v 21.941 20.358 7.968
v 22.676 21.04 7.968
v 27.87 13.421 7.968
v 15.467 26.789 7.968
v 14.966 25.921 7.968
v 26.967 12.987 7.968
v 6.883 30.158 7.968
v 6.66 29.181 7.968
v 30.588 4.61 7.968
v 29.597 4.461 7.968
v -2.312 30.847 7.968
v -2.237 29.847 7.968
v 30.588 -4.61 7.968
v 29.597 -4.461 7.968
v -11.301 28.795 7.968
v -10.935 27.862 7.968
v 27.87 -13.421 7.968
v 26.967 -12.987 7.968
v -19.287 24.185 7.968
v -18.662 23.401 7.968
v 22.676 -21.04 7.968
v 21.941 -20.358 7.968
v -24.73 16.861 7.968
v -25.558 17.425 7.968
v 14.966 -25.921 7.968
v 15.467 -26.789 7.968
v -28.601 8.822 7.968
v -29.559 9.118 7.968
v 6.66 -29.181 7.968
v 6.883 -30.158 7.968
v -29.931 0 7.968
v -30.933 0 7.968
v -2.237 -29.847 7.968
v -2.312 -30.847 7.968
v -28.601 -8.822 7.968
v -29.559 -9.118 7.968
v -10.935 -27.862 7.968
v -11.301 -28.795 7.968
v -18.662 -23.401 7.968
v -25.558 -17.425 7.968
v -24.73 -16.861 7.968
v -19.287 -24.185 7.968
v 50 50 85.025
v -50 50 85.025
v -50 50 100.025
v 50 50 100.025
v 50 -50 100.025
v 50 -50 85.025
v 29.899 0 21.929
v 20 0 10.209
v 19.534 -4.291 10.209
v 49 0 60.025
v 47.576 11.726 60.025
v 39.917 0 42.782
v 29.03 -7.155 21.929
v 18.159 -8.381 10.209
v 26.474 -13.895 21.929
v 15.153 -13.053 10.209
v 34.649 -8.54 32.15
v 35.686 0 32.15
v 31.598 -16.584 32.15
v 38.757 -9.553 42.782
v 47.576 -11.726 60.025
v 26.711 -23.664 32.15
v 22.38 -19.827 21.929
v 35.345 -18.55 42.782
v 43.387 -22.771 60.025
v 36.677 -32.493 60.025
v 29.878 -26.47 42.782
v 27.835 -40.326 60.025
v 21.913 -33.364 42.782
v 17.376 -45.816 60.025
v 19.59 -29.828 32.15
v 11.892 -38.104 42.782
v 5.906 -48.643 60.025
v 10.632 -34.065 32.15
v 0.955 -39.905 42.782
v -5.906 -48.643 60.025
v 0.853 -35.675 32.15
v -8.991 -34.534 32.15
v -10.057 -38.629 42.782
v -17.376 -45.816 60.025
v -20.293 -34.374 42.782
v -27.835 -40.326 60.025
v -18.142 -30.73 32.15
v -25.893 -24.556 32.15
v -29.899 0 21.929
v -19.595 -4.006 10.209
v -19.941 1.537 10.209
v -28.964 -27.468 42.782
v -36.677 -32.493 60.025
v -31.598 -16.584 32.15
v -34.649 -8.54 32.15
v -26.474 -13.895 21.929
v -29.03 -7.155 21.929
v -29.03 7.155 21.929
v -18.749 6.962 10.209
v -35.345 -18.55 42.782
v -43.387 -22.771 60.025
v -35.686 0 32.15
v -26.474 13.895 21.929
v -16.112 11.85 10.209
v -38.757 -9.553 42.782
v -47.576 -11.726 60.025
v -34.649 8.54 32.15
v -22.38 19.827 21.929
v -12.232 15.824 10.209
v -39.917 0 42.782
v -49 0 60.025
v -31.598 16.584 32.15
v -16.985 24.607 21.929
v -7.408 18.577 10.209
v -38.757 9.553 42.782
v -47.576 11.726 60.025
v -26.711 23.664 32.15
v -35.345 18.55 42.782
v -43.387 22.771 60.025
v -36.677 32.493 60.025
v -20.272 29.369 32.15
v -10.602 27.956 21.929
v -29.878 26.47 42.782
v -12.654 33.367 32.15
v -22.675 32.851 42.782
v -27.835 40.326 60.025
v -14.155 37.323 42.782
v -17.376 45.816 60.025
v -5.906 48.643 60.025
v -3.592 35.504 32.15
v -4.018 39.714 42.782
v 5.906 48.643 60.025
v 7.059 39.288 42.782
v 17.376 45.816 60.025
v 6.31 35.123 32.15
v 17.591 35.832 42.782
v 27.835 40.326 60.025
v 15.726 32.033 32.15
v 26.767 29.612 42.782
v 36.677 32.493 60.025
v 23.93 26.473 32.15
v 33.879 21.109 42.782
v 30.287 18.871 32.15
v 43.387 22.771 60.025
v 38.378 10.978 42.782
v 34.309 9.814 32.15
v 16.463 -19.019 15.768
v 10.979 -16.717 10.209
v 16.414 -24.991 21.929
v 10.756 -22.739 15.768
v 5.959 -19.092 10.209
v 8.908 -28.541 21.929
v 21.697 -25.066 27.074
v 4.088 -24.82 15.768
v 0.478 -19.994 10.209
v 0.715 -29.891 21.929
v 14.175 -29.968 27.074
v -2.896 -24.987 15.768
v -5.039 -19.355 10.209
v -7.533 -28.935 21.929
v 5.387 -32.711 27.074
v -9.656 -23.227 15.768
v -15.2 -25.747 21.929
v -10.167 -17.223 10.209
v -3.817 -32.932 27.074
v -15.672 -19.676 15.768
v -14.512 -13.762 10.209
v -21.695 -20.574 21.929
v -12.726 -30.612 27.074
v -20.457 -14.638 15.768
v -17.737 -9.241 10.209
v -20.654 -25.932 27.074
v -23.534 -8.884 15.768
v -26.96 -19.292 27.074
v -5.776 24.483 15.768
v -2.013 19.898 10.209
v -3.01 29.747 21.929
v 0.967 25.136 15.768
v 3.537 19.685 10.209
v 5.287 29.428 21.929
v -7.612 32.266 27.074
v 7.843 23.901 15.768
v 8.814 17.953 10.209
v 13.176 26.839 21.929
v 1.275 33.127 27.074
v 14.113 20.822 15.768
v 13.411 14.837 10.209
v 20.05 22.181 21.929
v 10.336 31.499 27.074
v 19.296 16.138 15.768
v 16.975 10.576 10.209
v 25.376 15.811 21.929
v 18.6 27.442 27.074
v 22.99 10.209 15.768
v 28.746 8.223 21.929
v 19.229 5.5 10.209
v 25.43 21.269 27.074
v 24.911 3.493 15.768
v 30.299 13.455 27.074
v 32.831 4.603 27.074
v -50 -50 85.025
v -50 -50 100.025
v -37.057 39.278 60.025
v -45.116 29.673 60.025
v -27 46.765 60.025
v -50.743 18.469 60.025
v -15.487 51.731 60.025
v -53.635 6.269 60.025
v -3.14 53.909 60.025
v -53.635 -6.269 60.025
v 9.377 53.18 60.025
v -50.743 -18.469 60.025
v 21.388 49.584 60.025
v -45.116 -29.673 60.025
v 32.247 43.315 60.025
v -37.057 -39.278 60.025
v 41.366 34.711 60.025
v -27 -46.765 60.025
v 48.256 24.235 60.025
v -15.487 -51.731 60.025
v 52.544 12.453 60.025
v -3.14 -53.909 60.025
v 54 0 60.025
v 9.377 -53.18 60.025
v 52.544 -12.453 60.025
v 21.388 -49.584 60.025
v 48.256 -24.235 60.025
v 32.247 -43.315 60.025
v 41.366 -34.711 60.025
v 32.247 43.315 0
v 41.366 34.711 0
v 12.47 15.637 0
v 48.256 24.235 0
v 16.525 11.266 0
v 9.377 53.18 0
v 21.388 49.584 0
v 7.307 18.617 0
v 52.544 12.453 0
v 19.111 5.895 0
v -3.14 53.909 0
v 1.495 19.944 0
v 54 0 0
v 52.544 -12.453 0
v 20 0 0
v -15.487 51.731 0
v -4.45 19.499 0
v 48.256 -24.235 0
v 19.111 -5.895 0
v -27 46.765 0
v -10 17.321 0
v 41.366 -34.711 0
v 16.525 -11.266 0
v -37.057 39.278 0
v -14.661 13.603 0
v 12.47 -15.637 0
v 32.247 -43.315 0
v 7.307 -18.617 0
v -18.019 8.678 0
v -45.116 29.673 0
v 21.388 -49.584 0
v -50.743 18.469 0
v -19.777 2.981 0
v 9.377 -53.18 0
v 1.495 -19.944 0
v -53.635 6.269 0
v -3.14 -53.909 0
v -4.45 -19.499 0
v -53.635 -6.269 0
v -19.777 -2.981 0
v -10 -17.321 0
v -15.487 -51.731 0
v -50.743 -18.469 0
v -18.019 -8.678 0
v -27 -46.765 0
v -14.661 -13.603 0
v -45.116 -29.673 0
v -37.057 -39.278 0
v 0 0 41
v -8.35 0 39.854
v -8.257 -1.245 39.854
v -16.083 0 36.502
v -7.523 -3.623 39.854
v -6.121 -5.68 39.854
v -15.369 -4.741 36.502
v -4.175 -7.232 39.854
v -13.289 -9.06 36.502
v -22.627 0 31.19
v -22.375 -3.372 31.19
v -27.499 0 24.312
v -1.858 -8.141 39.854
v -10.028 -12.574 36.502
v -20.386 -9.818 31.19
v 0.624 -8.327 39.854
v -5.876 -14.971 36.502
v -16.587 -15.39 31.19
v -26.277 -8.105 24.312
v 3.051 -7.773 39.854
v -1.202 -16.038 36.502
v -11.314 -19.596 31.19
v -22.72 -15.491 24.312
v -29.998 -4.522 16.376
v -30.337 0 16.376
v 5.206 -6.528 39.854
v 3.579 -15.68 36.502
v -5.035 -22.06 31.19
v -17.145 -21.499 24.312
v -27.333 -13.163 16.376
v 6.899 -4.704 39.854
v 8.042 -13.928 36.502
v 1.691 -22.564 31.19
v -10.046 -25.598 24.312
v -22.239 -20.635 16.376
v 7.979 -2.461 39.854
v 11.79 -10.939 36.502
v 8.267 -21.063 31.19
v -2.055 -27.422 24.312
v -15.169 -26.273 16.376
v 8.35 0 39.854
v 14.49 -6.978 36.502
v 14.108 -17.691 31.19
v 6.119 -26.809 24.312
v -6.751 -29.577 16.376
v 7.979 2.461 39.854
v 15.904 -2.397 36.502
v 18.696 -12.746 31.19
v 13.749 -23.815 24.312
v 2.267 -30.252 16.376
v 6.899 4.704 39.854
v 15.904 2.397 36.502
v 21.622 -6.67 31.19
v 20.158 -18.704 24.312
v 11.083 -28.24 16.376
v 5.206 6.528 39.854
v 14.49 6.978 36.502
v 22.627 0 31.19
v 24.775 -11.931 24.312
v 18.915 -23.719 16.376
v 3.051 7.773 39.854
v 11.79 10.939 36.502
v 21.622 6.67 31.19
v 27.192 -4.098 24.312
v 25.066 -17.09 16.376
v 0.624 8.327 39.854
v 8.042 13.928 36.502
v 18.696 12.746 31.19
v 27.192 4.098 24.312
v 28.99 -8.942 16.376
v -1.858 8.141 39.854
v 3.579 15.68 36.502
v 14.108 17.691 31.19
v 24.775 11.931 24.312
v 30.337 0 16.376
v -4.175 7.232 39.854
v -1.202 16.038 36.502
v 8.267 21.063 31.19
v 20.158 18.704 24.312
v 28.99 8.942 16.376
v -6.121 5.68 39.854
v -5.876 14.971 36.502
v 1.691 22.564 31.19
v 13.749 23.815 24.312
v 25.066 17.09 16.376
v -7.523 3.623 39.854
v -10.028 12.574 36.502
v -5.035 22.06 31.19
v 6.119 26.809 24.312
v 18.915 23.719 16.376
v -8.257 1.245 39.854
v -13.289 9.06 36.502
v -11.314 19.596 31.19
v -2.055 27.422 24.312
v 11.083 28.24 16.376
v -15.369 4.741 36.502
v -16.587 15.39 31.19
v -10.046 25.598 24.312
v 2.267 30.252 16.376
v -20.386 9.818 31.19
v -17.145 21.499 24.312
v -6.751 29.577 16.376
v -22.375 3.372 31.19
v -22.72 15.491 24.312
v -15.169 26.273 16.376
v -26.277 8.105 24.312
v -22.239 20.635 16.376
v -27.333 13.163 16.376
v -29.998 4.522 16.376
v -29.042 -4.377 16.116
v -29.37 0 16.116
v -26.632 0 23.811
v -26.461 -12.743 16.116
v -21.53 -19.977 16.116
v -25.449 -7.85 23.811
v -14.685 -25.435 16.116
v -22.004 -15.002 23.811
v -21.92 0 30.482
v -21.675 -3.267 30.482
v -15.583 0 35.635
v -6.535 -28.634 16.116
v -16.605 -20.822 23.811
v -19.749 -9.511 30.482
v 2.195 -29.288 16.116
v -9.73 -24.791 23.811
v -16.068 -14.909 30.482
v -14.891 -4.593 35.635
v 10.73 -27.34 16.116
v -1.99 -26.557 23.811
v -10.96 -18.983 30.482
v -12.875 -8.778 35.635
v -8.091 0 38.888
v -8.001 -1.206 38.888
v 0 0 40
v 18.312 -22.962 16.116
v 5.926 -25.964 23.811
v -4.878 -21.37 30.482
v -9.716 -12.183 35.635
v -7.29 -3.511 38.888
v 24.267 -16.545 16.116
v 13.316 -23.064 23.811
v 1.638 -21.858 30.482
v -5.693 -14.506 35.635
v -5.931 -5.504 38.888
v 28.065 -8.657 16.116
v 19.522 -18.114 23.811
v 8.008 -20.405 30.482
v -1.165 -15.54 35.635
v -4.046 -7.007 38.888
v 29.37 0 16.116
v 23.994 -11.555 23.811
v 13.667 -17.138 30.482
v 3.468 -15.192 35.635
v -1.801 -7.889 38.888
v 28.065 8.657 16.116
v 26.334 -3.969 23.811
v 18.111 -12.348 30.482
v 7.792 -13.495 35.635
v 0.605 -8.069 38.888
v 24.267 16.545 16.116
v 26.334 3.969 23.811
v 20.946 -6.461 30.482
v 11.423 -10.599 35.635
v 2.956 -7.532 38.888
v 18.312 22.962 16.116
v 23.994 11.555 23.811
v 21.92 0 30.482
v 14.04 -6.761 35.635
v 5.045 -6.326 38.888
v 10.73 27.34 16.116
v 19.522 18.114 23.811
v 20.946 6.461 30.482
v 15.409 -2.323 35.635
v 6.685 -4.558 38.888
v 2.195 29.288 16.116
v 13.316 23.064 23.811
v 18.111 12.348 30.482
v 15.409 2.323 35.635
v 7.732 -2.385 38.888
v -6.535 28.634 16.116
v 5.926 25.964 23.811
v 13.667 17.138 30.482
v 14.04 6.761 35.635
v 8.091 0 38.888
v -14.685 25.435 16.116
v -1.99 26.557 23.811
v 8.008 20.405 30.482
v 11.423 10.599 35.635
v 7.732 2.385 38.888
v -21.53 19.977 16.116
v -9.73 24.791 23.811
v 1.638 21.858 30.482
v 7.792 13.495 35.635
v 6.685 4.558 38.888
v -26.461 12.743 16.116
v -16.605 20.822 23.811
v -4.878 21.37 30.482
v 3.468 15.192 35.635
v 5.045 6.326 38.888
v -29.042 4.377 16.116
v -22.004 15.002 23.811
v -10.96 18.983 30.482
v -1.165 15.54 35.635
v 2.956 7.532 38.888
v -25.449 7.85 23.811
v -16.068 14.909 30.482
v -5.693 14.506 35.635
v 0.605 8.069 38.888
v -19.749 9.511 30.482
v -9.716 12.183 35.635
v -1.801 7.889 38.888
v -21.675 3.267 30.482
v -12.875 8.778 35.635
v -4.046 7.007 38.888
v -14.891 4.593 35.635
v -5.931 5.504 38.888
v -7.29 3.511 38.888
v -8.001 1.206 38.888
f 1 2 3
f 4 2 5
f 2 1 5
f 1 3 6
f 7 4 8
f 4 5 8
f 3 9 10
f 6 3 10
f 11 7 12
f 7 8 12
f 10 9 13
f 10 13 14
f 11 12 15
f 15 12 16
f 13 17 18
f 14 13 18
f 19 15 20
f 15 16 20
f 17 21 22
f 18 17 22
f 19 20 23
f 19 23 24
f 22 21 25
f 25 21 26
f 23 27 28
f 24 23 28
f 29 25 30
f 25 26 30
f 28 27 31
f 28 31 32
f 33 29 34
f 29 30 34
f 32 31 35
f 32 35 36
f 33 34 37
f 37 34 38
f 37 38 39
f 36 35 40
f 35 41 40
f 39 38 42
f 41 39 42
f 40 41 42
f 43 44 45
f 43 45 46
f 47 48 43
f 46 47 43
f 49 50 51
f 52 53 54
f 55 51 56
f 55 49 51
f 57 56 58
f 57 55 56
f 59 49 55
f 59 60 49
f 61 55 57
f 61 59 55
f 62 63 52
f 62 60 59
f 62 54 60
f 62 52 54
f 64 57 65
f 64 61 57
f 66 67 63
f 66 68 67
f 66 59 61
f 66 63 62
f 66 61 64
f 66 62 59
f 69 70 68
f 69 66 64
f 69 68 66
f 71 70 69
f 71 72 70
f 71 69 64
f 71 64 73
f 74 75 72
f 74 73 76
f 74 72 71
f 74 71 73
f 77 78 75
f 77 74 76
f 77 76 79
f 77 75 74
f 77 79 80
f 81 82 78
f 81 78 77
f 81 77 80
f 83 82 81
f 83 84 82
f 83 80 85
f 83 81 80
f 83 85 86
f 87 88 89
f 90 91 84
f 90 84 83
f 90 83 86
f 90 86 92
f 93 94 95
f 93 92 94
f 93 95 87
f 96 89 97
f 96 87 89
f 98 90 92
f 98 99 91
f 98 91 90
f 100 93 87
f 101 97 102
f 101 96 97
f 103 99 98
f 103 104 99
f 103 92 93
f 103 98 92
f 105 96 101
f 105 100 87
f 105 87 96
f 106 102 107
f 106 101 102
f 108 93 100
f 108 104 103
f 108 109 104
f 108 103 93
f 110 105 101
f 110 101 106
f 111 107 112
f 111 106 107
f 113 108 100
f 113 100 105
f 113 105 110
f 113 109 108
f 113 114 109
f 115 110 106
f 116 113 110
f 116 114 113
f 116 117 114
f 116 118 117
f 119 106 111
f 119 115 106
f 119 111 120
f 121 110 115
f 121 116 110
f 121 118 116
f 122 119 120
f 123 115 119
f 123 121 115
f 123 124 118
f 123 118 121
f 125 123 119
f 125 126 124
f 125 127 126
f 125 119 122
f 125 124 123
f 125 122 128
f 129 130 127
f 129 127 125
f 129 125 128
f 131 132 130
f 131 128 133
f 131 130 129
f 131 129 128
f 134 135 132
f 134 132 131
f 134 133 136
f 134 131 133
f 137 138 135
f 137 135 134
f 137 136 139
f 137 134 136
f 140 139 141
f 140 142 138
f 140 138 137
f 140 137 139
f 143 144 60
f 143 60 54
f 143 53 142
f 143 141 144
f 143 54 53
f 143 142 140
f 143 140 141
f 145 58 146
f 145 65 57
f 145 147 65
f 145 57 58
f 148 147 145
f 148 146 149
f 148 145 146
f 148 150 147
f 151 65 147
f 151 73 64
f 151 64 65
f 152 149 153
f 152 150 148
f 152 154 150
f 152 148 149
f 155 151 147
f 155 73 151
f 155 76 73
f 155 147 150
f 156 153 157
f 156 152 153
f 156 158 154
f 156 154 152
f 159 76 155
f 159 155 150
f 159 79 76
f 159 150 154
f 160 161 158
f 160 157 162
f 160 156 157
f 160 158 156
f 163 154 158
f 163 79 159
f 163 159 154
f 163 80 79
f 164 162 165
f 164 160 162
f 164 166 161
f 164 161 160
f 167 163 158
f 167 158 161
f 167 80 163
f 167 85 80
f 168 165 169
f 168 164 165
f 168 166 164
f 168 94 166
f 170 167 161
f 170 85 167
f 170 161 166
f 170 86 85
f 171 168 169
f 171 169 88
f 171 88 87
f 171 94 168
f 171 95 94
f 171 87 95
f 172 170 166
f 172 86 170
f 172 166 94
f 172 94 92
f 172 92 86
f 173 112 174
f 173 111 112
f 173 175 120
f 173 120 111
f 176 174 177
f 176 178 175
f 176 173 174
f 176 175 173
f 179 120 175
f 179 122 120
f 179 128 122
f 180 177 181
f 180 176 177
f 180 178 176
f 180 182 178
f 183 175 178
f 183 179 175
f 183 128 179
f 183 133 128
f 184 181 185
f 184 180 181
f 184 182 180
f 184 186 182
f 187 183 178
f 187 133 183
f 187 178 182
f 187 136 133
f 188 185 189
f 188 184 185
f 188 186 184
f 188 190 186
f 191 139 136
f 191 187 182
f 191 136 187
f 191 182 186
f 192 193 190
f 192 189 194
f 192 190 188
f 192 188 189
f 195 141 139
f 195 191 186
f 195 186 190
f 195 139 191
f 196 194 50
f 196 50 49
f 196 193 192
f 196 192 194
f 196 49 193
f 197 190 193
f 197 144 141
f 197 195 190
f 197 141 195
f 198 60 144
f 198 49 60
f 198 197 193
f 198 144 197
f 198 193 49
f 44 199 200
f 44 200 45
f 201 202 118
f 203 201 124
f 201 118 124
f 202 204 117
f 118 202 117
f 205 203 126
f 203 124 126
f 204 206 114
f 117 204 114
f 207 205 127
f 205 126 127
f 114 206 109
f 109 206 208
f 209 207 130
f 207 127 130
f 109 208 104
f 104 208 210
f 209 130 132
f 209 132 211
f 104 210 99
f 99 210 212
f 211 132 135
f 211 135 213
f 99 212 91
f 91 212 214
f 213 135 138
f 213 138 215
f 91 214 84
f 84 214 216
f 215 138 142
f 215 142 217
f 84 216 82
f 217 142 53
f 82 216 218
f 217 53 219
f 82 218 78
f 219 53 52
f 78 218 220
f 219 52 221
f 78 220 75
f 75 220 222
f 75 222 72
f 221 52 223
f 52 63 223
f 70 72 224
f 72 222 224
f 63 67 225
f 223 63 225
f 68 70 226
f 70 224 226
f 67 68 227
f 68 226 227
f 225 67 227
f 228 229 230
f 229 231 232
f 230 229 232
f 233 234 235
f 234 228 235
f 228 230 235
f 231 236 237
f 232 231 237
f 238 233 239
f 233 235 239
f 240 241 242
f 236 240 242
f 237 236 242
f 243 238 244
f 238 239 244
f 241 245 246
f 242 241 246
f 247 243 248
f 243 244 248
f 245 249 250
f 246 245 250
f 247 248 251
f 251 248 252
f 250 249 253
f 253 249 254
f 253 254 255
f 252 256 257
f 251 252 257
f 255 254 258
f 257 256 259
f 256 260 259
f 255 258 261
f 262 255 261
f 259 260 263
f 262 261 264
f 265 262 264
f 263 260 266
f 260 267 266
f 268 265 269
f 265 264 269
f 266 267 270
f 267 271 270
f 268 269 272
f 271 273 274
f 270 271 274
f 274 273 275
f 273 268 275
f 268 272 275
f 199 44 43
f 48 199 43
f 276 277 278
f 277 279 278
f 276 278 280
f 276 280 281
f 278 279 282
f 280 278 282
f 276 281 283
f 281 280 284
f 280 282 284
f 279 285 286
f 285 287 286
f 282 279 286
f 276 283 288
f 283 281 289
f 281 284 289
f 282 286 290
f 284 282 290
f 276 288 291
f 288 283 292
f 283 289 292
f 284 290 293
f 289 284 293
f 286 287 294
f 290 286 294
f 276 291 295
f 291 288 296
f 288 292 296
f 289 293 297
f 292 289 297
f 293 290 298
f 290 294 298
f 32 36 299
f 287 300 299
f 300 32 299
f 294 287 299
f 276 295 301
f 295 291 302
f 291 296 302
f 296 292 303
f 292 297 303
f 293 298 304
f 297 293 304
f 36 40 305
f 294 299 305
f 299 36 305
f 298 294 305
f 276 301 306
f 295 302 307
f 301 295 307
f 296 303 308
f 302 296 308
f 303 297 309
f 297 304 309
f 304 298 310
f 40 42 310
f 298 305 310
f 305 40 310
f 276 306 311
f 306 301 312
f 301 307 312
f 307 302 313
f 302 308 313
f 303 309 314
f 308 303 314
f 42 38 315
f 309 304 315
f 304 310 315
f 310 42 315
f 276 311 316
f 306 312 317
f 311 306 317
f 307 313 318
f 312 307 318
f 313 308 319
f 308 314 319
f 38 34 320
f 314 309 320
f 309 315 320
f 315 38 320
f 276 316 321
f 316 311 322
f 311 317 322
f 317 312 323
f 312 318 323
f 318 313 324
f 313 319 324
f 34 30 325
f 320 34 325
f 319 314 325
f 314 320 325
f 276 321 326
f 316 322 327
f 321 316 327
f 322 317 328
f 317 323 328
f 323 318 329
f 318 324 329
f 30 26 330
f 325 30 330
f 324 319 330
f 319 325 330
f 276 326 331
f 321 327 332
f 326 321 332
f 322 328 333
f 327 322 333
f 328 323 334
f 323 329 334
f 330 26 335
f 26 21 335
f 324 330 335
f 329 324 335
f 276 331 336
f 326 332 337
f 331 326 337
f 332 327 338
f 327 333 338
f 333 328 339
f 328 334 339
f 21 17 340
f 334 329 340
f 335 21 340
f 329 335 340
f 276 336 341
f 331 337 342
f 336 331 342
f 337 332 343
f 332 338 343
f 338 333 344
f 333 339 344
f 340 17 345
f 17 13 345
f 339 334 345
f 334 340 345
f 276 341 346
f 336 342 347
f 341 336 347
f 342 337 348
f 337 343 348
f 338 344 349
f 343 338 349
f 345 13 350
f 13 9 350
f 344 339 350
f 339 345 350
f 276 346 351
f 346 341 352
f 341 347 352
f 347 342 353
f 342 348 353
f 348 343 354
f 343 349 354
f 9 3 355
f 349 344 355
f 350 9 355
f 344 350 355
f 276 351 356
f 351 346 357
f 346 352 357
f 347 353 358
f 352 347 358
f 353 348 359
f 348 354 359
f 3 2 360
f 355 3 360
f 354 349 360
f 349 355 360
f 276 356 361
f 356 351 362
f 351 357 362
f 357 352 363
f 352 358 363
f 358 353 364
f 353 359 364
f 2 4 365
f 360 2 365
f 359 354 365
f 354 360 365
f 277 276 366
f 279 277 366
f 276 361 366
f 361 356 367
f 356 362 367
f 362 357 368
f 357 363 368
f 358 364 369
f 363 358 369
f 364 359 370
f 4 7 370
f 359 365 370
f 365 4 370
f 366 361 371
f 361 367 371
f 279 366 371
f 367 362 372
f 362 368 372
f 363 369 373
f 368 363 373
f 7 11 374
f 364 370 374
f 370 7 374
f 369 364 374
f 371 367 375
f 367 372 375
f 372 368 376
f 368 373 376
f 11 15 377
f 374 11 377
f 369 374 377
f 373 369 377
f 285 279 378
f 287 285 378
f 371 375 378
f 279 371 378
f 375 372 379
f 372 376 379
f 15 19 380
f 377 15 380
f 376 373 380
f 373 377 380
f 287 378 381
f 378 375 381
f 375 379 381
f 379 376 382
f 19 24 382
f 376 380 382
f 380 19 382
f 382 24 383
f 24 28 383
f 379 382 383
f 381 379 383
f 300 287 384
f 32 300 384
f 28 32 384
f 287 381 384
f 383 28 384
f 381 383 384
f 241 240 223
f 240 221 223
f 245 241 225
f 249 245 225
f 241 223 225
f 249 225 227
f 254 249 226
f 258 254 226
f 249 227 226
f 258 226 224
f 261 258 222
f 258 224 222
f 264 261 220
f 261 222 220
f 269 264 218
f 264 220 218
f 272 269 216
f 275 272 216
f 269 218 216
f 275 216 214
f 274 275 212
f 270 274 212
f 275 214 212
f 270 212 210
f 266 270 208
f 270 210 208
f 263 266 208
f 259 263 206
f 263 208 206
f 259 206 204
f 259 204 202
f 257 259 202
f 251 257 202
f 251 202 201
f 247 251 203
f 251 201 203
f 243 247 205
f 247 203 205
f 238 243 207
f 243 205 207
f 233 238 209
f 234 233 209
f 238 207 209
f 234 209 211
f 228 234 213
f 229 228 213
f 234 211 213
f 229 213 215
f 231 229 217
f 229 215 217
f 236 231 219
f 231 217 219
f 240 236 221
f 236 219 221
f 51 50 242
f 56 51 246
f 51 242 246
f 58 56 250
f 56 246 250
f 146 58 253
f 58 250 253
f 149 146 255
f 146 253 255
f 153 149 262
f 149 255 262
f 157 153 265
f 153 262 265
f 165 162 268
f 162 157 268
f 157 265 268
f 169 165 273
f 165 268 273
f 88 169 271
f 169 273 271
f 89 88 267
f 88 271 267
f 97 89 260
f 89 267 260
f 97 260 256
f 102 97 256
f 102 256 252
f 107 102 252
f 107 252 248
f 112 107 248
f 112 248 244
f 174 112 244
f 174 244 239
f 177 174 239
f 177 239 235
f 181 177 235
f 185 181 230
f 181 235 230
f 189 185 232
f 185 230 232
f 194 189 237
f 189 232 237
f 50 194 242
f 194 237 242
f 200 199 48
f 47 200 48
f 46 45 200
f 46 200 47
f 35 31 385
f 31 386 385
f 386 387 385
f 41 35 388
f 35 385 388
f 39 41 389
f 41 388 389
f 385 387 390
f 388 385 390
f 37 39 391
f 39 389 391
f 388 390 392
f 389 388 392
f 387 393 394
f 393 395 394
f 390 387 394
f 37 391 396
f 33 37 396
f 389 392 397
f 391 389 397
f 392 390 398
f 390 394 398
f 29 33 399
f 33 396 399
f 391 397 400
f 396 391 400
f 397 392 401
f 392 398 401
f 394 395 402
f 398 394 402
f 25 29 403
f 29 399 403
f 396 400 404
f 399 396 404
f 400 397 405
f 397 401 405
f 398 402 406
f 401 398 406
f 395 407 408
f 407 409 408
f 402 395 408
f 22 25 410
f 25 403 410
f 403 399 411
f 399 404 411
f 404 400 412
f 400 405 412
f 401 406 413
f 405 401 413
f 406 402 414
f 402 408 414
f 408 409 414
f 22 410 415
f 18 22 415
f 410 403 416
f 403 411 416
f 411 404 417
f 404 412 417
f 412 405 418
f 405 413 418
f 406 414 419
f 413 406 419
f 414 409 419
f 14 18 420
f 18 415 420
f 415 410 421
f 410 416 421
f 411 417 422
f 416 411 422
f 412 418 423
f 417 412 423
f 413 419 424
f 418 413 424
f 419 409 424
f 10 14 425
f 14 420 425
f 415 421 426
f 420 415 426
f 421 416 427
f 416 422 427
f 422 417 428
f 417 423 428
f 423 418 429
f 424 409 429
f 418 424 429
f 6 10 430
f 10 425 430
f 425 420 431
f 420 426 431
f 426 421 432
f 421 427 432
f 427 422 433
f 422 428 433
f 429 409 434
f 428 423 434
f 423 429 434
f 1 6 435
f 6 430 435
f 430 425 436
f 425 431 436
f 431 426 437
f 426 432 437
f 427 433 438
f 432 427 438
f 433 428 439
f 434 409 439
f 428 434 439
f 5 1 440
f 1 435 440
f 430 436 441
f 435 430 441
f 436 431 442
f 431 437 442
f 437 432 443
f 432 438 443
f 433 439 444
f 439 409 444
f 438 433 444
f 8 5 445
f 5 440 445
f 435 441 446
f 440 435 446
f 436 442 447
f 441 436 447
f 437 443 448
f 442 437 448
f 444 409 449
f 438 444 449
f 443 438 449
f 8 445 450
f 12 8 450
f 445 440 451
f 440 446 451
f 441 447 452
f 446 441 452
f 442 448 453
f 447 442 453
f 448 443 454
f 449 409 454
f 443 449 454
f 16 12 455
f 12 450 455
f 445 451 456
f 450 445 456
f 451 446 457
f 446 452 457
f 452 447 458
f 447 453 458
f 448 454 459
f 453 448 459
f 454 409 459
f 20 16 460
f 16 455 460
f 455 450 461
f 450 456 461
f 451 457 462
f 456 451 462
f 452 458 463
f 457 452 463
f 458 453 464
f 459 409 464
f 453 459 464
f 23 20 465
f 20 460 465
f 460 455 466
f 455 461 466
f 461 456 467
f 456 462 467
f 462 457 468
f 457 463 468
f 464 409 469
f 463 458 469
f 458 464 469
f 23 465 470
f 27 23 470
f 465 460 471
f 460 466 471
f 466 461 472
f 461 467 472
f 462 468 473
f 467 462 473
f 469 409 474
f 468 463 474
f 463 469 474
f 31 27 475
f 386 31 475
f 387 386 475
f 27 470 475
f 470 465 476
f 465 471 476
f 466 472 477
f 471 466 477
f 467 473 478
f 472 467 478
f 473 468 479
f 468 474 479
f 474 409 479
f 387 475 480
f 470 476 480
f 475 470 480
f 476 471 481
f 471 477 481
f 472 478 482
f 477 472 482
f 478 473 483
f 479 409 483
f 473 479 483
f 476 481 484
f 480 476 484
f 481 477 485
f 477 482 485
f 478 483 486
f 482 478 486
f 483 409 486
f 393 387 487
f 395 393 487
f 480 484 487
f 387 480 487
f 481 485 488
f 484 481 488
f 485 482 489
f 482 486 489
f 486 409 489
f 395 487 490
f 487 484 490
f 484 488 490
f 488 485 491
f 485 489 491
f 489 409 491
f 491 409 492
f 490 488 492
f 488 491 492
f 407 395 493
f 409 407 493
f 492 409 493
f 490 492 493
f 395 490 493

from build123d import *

# Parameters (mm, degrees)
F2_R      = 20
F3_DEPTH  = 60.0260001
F9_W      = 100
F9_H      = 100
F10_DEPTH = 15


with BuildPart() as f1:
    # F0 (on Front) → F1 (revolve)
    with BuildSketch(Plane.XZ):
        with BuildLine():
            Line((7, 0), (54, 0))
            Line((54, 0), (54, 60.025))
            Line((54, 60.025), (49, 60.025))
            add(Edge.make_bspline(
                [(7, 1.225), (8.2918844351, 1.656365385), (10.6344117794, 2.7992556088), (14.4726843549, 4.8552998081), (25.4154060733, 15.0353221815), (37.5535931678, 32.7083956946), (39.0819350647, 43.6967922724), (49, 60.025)],
                knots=[0.1746891991, 0.1746891991, 0.1746891991, 0.1746891991, 0.2650973756, 0.3588062568, 0.5353857795, 0.7360497648, 1, 1, 1, 1], degree=3))
            Line((7, 1.225), (7, 0))
        make_face()
    revolve(axis=Axis((0, 0, 75), (0, 0, -1)))

    # F2 (on face) → F3 (cut, through all)
    with BuildSketch(Plane(origin=(0, 0, 0), x_dir=(1, 0, 0), z_dir=(0, 0, -1))):
        Circle(F2_R)
    extrude(amount=-F3_DEPTH, mode=Mode.SUBTRACT)


with BuildPart() as f7:
    # F6 (on Front) → F7 (revolve)
    with BuildSketch(Plane.XZ):
        with BuildLine():
            ThreePointArc((-29.9311183954, 7.9682146759), (-21.9197805614, 30.4822659913), (0, 40))
            Line((0, 40), (0, 41))
            ThreePointArc((0, 41), (-22.6272550815, 31.1897930022), (-30.9333452507, 7.9682146759))
            Line((-30.9333452507, 7.9682146759), (-29.9311183954, 7.9682146759))
        make_face()
    revolve(axis=Axis((0, 0, 23.6347168684), (0, 0, 1)))


with BuildPart() as f10:
    # F9 (on offset) → F10 (new body)
    with BuildSketch(Plane.XY.offset(85.025)):
        Rectangle(F9_W, F9_H)
    extrude(amount=F10_DEPTH)


solid = Compound([f1.part, f7.part, f10.part])
